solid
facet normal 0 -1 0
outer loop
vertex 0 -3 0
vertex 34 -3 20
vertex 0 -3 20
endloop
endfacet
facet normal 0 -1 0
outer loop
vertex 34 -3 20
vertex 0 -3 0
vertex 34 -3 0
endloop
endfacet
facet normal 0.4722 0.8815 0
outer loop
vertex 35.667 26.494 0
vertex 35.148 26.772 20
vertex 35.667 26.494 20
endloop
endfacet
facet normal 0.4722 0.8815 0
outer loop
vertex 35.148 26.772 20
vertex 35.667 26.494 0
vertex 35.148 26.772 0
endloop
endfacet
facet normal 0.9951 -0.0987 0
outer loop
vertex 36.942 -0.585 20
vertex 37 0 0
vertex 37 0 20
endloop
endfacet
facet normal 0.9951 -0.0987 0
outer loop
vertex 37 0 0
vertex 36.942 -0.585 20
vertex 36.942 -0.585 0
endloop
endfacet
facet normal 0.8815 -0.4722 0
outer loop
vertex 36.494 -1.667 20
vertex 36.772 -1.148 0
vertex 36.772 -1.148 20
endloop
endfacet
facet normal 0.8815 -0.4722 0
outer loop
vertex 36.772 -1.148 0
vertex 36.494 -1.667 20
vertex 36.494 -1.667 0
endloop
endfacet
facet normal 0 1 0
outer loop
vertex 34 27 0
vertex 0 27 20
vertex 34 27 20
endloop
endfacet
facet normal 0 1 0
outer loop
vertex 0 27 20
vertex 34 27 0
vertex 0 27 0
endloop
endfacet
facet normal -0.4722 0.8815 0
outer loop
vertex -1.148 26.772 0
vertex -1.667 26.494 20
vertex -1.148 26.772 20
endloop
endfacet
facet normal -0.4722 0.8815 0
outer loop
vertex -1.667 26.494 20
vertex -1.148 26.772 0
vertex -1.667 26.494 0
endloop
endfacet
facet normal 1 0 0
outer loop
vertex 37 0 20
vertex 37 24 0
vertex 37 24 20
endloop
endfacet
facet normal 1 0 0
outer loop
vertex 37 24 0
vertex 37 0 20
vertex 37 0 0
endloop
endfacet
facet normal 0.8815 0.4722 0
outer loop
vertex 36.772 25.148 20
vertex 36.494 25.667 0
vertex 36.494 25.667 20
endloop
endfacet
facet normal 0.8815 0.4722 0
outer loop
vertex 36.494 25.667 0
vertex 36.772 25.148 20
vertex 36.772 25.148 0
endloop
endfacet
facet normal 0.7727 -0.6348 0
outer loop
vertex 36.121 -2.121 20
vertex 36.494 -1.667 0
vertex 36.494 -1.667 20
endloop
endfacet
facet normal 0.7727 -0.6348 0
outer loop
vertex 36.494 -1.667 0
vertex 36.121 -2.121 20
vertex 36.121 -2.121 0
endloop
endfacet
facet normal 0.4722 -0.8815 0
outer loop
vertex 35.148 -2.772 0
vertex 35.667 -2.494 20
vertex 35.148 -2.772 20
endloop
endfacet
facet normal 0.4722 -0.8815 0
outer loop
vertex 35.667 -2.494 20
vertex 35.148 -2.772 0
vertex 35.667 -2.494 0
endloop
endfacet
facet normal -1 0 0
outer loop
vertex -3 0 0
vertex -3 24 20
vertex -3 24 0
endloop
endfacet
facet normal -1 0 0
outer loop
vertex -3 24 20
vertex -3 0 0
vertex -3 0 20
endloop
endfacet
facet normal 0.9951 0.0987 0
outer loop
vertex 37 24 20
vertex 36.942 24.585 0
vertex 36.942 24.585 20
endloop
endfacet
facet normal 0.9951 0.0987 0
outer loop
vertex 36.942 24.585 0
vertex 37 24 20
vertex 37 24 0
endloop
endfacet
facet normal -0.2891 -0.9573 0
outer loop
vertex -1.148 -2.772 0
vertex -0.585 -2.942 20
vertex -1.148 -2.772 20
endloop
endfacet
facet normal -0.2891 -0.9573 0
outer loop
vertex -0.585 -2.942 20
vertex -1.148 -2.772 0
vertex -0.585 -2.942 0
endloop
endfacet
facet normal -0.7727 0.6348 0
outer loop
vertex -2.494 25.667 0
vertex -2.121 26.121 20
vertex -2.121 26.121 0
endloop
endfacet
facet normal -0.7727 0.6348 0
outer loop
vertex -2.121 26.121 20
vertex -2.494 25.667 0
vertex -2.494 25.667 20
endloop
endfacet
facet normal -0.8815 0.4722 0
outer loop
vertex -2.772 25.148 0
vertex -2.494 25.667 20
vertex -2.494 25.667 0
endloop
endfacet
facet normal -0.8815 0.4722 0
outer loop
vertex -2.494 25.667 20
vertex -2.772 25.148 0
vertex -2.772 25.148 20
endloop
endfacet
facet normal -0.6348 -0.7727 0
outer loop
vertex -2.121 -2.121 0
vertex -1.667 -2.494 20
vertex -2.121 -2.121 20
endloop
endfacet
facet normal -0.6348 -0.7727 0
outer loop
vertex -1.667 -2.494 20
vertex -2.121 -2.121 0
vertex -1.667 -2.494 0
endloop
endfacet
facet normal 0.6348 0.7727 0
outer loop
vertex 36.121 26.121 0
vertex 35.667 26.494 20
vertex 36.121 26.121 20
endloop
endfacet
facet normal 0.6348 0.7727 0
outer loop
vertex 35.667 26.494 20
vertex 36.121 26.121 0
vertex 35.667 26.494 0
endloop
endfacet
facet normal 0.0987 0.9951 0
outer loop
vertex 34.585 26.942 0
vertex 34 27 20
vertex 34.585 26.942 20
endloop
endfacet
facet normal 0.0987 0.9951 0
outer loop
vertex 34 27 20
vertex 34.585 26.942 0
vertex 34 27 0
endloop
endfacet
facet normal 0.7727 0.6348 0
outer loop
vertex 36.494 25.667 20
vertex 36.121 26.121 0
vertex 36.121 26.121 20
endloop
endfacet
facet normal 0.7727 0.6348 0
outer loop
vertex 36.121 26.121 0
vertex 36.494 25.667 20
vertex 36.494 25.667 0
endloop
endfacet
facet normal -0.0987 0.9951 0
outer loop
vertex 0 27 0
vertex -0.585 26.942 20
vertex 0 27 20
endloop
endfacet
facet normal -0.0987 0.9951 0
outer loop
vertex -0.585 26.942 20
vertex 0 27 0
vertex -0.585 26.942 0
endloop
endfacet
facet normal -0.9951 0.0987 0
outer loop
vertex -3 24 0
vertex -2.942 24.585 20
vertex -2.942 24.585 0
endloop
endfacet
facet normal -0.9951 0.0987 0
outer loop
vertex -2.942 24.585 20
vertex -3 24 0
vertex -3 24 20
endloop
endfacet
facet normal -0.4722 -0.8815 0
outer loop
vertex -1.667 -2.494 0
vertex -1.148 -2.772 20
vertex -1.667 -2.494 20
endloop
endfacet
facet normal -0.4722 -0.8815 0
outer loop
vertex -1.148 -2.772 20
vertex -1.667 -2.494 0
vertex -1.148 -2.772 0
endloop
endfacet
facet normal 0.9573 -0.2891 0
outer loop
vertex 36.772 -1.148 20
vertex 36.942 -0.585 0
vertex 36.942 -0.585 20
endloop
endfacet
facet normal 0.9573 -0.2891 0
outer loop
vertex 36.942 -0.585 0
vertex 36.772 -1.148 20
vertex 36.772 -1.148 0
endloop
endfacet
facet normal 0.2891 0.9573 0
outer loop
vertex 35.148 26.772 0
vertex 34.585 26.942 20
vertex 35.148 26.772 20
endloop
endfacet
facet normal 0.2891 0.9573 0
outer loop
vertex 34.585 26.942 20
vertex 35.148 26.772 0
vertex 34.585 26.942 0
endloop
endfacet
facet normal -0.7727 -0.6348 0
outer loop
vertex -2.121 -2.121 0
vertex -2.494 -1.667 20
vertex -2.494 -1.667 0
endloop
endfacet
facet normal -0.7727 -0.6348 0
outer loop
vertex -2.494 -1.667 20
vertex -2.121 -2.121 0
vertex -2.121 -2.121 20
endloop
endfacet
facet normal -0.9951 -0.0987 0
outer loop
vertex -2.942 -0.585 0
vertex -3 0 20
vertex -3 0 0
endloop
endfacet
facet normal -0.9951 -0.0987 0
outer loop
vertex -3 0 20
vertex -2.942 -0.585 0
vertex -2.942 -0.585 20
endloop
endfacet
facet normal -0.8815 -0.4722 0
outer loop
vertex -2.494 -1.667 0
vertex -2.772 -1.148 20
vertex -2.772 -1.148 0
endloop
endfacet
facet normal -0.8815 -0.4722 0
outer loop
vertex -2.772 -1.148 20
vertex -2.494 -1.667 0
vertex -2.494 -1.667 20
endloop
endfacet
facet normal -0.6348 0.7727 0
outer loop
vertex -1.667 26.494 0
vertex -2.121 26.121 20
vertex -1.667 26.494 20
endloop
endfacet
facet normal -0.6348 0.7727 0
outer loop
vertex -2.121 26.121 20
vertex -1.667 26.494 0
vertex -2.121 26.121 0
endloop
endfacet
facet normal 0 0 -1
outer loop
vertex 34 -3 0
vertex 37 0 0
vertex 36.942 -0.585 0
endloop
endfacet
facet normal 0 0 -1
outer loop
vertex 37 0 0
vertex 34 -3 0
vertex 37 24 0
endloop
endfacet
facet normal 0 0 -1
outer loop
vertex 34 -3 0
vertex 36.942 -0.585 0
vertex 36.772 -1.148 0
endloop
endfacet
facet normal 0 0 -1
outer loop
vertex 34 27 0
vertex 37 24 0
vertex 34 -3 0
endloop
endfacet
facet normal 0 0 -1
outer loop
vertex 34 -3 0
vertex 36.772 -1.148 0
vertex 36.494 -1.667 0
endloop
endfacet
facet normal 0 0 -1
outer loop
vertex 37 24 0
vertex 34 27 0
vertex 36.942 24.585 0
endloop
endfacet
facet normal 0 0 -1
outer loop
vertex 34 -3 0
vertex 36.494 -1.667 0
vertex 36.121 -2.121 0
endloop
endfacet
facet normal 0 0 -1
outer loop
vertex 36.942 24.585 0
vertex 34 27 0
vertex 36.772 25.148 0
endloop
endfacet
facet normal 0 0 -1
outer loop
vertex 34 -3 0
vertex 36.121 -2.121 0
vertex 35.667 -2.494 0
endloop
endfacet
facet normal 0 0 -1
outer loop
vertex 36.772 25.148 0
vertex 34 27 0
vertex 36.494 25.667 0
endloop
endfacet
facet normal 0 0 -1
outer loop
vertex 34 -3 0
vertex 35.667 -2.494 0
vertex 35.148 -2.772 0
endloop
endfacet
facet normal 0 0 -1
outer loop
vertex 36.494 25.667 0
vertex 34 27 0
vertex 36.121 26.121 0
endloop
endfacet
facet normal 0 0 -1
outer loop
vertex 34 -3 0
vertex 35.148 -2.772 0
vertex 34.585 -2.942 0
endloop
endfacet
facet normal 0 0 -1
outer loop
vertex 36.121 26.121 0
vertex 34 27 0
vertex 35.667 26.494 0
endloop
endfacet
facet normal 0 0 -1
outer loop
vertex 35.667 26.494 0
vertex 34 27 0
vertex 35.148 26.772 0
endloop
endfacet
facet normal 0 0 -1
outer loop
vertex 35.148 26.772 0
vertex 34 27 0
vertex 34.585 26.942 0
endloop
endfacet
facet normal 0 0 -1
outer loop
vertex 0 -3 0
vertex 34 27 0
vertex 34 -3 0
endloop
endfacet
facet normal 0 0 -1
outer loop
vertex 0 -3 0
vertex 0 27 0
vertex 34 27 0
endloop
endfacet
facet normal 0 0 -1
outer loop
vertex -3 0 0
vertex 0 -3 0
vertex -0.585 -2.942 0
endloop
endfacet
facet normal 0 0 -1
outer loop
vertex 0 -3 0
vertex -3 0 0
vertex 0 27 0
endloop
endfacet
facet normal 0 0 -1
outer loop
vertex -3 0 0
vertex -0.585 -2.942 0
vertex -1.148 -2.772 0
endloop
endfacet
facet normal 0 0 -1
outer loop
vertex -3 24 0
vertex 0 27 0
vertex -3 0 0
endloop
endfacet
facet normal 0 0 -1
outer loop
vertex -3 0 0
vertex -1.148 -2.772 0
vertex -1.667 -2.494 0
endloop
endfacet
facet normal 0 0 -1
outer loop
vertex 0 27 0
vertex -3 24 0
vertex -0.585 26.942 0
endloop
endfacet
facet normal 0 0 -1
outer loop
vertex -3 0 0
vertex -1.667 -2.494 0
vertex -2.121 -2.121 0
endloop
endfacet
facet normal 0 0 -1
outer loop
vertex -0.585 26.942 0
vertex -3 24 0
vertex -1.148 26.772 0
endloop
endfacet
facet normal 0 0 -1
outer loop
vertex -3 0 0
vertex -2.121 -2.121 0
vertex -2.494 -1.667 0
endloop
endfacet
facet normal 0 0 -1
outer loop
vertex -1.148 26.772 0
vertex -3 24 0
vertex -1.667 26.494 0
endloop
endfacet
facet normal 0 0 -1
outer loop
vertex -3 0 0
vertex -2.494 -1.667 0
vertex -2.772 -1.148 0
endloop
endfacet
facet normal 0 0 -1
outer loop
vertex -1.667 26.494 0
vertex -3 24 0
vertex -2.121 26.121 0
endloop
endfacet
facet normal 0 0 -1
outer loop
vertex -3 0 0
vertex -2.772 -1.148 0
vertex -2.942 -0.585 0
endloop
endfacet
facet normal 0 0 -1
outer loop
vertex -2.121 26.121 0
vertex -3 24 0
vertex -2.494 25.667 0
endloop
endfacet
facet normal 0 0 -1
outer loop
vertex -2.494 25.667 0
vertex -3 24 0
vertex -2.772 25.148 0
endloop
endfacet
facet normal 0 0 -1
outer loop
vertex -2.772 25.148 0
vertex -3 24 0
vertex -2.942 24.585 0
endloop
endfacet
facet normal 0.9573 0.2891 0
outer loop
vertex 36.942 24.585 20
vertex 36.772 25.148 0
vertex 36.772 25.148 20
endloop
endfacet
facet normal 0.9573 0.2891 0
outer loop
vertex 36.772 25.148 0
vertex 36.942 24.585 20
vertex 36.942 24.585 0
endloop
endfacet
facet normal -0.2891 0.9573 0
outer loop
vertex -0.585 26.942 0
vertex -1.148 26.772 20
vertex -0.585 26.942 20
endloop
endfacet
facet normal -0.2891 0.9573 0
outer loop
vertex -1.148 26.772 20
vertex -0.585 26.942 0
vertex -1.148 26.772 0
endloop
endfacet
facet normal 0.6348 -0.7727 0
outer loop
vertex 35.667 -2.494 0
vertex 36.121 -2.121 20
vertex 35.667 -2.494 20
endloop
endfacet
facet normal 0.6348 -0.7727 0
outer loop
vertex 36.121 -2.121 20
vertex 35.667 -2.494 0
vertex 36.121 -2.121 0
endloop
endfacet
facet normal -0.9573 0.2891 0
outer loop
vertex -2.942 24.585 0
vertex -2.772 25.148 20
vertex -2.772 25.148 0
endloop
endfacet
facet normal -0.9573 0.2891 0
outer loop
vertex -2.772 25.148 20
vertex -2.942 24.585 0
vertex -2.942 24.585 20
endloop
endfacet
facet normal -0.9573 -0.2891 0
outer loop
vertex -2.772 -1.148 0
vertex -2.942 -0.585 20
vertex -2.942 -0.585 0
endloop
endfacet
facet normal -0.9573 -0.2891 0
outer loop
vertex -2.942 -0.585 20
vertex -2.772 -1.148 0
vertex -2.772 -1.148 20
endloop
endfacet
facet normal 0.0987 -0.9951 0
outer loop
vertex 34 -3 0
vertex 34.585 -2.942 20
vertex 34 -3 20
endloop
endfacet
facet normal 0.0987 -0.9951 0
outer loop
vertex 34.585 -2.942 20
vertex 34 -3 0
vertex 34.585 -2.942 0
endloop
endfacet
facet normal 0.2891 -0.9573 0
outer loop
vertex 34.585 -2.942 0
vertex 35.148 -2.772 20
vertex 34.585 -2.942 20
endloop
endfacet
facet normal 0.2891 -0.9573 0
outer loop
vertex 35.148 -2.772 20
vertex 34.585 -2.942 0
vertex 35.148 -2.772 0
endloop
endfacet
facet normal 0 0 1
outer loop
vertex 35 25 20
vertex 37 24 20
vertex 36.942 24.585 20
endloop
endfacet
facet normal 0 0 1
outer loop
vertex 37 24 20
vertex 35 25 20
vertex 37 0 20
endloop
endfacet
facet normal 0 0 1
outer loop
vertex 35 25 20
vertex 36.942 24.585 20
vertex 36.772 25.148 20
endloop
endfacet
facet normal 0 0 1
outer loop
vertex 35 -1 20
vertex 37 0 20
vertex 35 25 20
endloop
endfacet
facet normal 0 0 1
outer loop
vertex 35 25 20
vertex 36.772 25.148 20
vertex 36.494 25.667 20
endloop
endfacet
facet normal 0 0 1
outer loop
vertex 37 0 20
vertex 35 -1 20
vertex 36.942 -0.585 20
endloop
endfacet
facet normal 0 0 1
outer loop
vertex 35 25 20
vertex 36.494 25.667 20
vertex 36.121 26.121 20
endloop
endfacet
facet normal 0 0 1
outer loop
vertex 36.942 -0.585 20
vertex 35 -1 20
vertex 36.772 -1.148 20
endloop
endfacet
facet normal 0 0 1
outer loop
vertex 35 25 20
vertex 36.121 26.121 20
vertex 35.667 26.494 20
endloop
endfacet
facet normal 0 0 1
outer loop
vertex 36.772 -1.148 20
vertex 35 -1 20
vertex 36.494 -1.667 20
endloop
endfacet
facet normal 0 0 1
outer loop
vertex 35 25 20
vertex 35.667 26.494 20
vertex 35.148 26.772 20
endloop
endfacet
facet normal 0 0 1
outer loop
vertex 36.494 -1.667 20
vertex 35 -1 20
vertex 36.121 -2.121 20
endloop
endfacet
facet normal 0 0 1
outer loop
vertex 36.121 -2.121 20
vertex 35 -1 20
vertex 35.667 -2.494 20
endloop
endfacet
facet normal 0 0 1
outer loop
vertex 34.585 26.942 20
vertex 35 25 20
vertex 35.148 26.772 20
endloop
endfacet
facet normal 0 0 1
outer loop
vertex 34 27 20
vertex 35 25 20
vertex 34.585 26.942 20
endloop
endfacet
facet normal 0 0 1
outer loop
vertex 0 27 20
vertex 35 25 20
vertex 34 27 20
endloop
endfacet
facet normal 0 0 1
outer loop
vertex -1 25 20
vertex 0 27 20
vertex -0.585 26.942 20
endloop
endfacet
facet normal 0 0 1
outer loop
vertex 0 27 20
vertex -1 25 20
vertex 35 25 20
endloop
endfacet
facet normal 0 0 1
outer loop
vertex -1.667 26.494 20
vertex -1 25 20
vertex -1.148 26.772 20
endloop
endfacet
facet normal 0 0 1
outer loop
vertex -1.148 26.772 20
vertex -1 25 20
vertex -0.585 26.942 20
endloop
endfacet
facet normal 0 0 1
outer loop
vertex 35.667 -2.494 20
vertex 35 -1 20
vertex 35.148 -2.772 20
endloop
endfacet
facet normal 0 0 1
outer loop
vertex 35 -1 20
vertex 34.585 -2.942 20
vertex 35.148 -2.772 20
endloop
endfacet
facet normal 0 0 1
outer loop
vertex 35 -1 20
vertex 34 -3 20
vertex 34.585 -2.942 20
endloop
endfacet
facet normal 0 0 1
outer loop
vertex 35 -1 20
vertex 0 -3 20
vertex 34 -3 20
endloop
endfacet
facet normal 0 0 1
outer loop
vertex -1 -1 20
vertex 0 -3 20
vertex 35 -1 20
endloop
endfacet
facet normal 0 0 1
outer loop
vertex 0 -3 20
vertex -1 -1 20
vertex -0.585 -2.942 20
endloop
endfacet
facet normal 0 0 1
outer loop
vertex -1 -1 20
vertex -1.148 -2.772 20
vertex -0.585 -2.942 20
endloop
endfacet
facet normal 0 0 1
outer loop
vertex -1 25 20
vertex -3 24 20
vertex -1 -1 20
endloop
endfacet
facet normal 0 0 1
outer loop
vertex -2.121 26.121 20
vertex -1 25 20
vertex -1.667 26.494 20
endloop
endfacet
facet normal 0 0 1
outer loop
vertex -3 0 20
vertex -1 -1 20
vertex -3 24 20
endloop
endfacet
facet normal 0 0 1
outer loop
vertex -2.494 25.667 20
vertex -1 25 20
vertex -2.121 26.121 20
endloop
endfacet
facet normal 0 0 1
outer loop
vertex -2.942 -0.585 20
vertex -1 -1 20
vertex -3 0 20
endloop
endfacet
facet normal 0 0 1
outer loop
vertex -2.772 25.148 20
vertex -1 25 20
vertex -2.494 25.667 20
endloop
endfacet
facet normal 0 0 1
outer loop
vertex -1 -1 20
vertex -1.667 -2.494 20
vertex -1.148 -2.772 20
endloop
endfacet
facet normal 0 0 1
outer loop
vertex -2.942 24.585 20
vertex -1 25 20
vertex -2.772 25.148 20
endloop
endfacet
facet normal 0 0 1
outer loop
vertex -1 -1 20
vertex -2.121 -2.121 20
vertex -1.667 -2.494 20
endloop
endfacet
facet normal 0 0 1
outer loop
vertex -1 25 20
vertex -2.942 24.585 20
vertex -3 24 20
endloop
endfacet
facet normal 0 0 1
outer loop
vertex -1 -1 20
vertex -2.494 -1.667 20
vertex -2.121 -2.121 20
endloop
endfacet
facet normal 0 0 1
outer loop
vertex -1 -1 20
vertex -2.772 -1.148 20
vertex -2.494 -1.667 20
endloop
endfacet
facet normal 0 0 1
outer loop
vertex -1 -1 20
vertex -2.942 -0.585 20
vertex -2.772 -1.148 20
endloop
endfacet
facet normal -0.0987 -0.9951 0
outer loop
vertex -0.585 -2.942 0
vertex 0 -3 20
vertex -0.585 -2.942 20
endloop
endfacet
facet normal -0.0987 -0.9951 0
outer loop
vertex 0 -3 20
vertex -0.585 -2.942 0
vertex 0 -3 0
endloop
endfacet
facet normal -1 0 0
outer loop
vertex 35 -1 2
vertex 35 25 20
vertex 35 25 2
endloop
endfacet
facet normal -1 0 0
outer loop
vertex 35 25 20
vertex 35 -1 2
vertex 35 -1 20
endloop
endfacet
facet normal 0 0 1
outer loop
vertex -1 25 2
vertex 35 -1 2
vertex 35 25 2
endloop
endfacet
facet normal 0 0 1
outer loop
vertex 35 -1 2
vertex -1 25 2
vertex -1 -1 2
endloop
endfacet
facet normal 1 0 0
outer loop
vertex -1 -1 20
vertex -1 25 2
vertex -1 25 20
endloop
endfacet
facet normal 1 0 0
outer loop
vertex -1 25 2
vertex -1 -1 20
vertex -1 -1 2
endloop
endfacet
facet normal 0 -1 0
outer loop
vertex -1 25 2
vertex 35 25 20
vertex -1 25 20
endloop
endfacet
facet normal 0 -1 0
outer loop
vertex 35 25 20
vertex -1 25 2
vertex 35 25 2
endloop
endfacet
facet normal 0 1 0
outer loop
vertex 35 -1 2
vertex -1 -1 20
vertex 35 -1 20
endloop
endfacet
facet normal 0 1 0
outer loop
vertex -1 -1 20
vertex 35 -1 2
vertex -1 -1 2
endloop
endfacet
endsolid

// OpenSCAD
// A simple parametric box with rounded edges and a hollow interior
length = 40; // [10:100]
width = 30;  // [5:80]
height = 20; // [5:60]
wall = 2;    // [1:5]
radius = 3;  // [1:10]

difference() {
    minkowski() {
        cube([length - 2*radius, width - 2*radius, height/2]);
        cylinder(r=radius, h=height/2, $fn=32);
    }
    translate([-wall / 2, -wall / 2, wall])
        cube([length - wall*2, width - 2*wall, height]);
}
